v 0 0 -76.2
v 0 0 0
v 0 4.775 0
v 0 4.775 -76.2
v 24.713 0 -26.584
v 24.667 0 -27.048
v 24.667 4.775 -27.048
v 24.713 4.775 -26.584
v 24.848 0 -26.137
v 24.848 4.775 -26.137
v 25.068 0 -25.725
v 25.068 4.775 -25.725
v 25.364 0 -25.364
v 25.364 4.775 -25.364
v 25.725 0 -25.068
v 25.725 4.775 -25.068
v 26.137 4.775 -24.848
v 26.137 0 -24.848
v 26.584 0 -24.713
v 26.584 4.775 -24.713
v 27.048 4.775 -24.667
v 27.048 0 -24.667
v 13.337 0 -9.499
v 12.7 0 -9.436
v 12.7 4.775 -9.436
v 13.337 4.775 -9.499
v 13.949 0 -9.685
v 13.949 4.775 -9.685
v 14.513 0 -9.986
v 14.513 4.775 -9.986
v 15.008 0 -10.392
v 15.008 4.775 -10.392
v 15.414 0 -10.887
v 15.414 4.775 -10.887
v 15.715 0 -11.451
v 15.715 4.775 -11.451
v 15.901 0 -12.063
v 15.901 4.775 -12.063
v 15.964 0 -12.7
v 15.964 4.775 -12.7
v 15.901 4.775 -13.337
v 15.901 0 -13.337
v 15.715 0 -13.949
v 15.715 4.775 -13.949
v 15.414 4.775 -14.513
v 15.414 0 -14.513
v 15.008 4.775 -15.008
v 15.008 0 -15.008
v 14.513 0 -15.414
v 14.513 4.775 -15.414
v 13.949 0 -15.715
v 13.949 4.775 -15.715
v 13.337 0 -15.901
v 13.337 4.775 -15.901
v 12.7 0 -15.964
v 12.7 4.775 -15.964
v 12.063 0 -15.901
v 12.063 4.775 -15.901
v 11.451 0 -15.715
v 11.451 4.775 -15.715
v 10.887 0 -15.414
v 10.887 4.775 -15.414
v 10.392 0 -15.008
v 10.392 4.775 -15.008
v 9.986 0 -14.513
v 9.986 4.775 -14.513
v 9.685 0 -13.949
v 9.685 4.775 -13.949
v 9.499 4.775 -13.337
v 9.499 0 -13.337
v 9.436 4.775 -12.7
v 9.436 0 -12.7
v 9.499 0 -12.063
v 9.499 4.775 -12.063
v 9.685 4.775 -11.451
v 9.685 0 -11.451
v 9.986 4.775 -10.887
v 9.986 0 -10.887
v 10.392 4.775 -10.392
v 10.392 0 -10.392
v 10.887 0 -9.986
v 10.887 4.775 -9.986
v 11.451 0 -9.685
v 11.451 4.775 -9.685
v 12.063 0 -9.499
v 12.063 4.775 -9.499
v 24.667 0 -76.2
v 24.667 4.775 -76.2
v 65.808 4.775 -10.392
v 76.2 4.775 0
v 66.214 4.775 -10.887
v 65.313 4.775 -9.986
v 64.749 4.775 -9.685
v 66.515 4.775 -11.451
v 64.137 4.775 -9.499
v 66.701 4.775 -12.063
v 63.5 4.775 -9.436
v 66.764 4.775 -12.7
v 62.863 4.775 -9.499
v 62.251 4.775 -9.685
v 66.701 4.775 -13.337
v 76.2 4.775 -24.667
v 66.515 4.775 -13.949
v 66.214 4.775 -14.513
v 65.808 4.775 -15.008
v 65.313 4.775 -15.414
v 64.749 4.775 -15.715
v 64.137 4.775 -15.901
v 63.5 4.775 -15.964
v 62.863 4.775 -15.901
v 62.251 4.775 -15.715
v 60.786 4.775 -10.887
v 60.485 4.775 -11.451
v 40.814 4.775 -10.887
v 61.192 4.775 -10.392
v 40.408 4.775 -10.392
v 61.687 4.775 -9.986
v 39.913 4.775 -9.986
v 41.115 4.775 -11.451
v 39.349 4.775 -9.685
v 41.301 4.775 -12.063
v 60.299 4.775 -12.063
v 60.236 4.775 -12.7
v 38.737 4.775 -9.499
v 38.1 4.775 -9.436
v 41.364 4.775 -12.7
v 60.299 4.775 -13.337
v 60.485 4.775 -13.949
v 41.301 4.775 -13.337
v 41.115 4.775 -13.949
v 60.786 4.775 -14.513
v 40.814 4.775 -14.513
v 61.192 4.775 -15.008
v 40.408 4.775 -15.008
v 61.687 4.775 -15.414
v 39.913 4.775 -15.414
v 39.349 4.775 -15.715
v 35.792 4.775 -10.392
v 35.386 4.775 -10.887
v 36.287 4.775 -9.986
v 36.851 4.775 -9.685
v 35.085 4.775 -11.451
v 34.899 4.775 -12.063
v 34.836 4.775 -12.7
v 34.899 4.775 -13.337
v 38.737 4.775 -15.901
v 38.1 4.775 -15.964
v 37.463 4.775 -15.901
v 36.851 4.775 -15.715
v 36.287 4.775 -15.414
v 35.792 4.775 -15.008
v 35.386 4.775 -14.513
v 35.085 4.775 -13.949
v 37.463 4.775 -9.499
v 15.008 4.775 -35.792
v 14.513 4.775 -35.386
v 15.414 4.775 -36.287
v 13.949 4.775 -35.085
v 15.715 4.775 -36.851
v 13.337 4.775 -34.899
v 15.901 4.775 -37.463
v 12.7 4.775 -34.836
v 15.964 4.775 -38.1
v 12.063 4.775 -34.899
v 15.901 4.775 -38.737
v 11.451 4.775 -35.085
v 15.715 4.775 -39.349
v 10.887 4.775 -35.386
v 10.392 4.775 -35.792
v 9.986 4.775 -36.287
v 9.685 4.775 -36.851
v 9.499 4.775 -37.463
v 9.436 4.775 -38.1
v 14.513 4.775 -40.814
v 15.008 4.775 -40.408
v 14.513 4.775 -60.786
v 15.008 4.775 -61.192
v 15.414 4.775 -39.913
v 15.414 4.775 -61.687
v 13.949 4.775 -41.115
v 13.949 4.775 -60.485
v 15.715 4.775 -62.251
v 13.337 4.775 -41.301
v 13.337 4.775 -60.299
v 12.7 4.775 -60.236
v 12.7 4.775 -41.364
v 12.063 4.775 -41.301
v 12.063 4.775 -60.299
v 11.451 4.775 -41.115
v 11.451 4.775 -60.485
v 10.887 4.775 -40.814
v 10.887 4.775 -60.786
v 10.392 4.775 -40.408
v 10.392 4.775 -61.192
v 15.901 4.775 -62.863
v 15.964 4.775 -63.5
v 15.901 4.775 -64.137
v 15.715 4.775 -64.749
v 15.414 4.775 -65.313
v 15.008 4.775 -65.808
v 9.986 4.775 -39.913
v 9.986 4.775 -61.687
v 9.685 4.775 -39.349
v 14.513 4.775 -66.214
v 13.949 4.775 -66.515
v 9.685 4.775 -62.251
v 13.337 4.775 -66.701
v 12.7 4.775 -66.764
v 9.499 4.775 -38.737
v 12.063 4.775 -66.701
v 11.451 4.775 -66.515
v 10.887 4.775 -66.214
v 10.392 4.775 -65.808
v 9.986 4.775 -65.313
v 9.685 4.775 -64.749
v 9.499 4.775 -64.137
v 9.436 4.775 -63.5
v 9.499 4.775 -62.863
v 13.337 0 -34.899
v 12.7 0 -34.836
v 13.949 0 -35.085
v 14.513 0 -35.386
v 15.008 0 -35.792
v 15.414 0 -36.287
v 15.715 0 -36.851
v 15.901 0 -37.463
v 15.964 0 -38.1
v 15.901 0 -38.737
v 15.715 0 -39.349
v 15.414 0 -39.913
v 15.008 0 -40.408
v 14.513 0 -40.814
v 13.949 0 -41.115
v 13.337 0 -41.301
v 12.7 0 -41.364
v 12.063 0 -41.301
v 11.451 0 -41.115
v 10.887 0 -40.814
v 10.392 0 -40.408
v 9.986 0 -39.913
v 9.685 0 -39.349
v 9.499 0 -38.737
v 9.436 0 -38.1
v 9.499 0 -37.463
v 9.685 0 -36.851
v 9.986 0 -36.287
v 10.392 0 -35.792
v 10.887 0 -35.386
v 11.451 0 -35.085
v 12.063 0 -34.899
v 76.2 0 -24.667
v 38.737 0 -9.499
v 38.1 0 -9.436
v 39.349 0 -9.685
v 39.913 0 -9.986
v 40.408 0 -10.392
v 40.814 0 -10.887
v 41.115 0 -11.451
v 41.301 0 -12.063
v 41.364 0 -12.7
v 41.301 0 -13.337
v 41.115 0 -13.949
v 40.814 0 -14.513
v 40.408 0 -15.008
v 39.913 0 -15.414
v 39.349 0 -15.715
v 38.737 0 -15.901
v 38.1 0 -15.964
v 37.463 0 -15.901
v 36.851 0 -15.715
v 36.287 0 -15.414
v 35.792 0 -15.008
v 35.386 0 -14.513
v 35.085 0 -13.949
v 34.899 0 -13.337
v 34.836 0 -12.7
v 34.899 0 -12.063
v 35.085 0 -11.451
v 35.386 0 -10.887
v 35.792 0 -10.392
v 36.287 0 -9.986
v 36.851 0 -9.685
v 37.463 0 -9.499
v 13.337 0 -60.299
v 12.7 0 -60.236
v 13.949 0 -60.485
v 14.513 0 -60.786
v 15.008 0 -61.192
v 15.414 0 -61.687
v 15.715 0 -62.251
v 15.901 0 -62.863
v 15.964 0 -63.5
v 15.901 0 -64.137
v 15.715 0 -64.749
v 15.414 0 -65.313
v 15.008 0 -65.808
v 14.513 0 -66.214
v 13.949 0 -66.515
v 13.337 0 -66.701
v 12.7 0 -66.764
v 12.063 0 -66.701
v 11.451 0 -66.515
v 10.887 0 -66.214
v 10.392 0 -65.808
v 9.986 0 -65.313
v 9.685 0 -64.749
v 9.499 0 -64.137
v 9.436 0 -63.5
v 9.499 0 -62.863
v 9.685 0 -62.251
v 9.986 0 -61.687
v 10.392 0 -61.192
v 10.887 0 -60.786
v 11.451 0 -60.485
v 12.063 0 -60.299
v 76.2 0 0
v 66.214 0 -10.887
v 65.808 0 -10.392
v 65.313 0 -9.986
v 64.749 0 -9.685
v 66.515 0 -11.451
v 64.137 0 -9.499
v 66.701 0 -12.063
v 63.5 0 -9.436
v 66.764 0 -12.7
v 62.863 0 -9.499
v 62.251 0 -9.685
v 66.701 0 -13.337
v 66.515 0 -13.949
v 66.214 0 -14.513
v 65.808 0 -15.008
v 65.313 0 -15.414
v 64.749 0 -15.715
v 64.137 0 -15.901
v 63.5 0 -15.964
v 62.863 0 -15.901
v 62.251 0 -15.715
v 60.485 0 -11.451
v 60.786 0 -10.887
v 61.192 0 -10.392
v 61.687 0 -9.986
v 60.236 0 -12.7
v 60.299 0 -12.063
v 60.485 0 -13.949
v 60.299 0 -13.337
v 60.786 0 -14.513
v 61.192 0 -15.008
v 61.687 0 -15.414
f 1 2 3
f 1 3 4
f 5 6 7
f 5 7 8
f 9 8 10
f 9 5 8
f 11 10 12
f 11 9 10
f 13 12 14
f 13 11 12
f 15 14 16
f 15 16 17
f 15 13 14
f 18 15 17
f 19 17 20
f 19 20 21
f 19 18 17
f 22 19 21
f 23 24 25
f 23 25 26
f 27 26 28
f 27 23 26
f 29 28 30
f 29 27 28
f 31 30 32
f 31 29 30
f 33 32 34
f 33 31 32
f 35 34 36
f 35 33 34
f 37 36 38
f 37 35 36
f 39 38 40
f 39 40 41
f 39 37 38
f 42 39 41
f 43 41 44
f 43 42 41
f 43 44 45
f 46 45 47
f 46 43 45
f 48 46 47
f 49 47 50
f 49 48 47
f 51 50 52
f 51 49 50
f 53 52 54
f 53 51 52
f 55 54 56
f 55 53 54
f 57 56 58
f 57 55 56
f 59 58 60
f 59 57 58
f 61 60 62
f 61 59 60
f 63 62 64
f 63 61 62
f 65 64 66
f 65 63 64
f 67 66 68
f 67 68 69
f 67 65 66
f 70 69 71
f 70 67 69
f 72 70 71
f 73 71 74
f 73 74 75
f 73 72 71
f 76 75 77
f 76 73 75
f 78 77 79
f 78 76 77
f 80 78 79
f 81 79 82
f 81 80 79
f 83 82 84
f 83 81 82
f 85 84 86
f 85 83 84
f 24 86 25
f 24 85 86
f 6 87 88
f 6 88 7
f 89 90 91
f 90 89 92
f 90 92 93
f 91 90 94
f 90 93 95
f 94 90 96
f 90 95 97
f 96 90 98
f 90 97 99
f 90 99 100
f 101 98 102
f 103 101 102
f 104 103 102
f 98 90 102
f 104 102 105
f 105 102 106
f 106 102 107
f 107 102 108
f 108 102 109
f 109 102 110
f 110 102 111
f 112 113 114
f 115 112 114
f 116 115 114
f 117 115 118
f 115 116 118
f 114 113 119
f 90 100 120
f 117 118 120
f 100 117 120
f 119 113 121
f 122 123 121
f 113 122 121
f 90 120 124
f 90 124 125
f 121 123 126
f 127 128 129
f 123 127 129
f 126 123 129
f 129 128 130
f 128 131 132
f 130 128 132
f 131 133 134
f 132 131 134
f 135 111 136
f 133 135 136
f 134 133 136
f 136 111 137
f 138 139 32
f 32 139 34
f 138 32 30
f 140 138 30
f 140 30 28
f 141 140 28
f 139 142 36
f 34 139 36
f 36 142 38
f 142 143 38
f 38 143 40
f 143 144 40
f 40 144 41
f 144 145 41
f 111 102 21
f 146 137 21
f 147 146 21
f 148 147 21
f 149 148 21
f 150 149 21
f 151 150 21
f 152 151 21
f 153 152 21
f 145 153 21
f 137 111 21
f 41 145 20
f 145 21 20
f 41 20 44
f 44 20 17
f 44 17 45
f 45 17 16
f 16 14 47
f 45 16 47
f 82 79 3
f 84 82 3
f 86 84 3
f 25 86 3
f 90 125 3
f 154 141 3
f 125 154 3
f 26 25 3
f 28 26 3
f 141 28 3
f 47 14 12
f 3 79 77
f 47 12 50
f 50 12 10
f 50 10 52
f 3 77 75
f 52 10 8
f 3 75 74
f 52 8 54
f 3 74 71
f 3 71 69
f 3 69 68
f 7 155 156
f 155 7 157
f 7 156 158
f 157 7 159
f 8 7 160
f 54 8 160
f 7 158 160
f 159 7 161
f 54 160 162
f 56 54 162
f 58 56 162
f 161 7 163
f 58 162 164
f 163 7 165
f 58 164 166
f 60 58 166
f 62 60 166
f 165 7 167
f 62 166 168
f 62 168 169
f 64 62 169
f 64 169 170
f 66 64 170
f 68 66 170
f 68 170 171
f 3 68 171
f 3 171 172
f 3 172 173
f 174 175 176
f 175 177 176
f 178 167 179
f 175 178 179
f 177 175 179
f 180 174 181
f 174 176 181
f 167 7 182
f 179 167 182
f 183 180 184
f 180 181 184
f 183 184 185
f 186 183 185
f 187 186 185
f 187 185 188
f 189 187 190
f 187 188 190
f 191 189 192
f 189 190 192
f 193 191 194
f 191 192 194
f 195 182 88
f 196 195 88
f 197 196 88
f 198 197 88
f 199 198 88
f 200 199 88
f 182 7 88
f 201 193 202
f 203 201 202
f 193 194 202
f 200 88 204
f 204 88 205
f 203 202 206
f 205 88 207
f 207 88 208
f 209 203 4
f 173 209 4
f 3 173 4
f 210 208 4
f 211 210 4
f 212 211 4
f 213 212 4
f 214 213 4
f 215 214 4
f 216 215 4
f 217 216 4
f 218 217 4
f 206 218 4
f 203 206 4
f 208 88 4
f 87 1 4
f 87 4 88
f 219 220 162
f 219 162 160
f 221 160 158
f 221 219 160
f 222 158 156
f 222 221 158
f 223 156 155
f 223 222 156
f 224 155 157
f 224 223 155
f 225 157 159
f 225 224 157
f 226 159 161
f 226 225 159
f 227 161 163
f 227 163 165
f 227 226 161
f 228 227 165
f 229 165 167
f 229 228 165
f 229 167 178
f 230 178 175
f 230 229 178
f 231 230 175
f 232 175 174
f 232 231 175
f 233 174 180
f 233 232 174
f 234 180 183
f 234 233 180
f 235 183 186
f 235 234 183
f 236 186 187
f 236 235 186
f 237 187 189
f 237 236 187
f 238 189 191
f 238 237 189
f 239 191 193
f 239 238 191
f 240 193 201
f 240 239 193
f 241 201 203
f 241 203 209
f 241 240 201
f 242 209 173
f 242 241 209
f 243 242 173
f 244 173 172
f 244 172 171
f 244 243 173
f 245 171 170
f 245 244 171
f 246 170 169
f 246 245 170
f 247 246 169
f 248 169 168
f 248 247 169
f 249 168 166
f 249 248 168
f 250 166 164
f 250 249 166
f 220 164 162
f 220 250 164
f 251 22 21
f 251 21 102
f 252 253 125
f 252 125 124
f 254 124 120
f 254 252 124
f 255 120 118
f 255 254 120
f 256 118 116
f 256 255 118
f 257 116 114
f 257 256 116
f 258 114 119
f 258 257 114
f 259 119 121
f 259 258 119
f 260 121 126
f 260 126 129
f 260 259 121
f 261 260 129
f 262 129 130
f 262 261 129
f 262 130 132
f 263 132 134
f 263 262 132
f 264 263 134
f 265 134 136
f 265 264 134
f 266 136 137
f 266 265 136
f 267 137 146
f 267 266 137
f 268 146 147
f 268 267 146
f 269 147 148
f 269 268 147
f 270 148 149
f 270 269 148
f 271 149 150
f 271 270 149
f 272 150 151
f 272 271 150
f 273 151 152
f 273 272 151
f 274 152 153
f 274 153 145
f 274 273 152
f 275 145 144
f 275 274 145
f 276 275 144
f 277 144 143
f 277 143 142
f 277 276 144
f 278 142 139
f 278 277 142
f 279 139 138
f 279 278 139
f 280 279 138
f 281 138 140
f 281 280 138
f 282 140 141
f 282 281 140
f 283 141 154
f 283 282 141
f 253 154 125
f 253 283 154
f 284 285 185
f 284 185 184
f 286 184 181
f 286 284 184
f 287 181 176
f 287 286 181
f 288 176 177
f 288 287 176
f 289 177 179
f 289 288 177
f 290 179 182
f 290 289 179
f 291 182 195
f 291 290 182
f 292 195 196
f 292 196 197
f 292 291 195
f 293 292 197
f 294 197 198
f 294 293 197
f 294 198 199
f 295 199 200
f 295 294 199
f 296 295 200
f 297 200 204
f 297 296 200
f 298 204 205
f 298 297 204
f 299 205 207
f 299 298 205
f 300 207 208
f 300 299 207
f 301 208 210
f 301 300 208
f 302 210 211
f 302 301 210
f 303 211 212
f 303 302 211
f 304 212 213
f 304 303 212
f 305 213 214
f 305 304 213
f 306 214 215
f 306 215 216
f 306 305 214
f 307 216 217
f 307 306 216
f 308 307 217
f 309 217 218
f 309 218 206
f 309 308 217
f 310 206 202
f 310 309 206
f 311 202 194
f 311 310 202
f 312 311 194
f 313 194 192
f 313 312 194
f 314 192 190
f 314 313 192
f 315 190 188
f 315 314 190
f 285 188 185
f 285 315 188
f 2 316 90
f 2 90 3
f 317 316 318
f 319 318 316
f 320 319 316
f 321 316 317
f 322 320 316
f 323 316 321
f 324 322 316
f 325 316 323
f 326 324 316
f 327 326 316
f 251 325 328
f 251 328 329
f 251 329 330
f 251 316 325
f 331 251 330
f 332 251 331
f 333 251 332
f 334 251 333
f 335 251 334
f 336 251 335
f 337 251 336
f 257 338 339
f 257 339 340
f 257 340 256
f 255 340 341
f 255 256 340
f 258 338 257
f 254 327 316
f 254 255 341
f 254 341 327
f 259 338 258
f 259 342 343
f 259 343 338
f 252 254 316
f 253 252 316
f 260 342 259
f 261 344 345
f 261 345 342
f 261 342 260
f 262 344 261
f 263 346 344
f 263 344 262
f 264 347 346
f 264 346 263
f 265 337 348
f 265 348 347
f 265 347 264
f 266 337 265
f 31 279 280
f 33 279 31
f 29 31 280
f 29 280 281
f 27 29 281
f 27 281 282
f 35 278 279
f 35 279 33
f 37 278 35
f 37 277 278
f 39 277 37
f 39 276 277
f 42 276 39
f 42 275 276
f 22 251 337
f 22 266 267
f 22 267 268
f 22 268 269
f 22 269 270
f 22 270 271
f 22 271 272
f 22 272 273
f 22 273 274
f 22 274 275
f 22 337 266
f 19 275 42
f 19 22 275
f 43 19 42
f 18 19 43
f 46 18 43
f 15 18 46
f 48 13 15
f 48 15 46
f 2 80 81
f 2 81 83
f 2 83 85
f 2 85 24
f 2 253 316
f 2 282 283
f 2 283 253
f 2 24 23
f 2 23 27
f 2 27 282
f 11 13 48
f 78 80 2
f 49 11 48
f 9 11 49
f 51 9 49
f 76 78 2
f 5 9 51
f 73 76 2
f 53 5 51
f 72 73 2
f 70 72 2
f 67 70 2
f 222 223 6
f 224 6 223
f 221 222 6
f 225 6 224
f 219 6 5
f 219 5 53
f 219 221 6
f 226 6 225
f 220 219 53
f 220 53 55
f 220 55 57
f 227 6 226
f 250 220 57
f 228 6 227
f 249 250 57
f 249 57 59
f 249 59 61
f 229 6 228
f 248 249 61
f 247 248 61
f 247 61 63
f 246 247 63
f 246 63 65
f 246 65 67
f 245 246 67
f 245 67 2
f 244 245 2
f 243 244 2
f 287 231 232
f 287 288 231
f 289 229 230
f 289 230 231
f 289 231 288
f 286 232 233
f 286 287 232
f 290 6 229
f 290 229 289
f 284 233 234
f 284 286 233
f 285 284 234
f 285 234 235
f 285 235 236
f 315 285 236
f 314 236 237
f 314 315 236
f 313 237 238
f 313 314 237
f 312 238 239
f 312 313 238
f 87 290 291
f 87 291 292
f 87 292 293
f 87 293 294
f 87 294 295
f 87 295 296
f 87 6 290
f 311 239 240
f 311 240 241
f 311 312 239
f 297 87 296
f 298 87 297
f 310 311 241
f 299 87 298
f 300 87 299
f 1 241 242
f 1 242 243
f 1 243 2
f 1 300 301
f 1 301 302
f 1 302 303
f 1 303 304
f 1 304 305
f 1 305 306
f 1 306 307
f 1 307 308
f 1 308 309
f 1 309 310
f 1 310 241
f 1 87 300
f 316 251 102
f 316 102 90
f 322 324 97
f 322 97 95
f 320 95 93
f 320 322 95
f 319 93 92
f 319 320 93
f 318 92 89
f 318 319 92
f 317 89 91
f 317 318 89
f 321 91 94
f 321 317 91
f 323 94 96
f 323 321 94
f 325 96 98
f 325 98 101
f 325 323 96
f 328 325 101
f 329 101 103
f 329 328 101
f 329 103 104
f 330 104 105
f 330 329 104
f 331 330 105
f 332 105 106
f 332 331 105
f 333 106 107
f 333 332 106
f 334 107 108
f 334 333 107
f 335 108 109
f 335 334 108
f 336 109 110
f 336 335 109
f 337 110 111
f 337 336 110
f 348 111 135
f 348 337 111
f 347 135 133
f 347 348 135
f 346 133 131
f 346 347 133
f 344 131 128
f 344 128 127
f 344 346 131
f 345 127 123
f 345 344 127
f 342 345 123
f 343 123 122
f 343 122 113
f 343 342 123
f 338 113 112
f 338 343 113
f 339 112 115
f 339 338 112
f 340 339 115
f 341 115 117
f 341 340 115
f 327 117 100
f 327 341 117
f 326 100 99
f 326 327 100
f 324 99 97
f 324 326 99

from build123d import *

# Parameters (mm, degrees)
SKETCH1_R      = 3.2639
EXTRUDE1_DEPTH = 4.7752


with BuildPart() as part:
    # Sketch1 → Extrude1 (new body)
    with BuildSketch(Plane(origin=(0, 0, 0), x_dir=(1, 0, 0), z_dir=(0, 1, 0))):
        with BuildLine():
            Line((24.666993976, 76.2), (24.666993976, 27.048243976))
            ThreePointArc((24.666993976, 27.048243976), (25.364445953, 25.364445953), (27.048243976, 24.666993976))
            Line((27.048243976, 24.666993976), (76.2, 24.666993976))
            Line((76.2, 24.666993976), (76.2, 0))
            Line((76.2, 0), (0, 0))
            Line((0, 0), (0, 76.2))
            Line((0, 76.2), (24.666993976, 76.2))
        make_face()
        with Locations(Location((12.7, 63.5, 0), (0, 0, 270))):
            Circle(SKETCH1_R, mode=Mode.SUBTRACT)
        with Locations(Location((12.7, 38.1, 0), (0, 0, 270))):
            Circle(SKETCH1_R, mode=Mode.SUBTRACT)
        with Locations(Location((12.7, 12.7, 0), (0, 0, 270))):
            Circle(SKETCH1_R, mode=Mode.SUBTRACT)
        with Locations(Location((38.1, 12.7, 0), (0, 0, 270))):
            Circle(SKETCH1_R, mode=Mode.SUBTRACT)
        with Locations(Location((63.5, 12.7, 0), (0, 0, 270))):
            Circle(SKETCH1_R, mode=Mode.SUBTRACT)
    extrude(amount=EXTRUDE1_DEPTH)


solid = part.part
